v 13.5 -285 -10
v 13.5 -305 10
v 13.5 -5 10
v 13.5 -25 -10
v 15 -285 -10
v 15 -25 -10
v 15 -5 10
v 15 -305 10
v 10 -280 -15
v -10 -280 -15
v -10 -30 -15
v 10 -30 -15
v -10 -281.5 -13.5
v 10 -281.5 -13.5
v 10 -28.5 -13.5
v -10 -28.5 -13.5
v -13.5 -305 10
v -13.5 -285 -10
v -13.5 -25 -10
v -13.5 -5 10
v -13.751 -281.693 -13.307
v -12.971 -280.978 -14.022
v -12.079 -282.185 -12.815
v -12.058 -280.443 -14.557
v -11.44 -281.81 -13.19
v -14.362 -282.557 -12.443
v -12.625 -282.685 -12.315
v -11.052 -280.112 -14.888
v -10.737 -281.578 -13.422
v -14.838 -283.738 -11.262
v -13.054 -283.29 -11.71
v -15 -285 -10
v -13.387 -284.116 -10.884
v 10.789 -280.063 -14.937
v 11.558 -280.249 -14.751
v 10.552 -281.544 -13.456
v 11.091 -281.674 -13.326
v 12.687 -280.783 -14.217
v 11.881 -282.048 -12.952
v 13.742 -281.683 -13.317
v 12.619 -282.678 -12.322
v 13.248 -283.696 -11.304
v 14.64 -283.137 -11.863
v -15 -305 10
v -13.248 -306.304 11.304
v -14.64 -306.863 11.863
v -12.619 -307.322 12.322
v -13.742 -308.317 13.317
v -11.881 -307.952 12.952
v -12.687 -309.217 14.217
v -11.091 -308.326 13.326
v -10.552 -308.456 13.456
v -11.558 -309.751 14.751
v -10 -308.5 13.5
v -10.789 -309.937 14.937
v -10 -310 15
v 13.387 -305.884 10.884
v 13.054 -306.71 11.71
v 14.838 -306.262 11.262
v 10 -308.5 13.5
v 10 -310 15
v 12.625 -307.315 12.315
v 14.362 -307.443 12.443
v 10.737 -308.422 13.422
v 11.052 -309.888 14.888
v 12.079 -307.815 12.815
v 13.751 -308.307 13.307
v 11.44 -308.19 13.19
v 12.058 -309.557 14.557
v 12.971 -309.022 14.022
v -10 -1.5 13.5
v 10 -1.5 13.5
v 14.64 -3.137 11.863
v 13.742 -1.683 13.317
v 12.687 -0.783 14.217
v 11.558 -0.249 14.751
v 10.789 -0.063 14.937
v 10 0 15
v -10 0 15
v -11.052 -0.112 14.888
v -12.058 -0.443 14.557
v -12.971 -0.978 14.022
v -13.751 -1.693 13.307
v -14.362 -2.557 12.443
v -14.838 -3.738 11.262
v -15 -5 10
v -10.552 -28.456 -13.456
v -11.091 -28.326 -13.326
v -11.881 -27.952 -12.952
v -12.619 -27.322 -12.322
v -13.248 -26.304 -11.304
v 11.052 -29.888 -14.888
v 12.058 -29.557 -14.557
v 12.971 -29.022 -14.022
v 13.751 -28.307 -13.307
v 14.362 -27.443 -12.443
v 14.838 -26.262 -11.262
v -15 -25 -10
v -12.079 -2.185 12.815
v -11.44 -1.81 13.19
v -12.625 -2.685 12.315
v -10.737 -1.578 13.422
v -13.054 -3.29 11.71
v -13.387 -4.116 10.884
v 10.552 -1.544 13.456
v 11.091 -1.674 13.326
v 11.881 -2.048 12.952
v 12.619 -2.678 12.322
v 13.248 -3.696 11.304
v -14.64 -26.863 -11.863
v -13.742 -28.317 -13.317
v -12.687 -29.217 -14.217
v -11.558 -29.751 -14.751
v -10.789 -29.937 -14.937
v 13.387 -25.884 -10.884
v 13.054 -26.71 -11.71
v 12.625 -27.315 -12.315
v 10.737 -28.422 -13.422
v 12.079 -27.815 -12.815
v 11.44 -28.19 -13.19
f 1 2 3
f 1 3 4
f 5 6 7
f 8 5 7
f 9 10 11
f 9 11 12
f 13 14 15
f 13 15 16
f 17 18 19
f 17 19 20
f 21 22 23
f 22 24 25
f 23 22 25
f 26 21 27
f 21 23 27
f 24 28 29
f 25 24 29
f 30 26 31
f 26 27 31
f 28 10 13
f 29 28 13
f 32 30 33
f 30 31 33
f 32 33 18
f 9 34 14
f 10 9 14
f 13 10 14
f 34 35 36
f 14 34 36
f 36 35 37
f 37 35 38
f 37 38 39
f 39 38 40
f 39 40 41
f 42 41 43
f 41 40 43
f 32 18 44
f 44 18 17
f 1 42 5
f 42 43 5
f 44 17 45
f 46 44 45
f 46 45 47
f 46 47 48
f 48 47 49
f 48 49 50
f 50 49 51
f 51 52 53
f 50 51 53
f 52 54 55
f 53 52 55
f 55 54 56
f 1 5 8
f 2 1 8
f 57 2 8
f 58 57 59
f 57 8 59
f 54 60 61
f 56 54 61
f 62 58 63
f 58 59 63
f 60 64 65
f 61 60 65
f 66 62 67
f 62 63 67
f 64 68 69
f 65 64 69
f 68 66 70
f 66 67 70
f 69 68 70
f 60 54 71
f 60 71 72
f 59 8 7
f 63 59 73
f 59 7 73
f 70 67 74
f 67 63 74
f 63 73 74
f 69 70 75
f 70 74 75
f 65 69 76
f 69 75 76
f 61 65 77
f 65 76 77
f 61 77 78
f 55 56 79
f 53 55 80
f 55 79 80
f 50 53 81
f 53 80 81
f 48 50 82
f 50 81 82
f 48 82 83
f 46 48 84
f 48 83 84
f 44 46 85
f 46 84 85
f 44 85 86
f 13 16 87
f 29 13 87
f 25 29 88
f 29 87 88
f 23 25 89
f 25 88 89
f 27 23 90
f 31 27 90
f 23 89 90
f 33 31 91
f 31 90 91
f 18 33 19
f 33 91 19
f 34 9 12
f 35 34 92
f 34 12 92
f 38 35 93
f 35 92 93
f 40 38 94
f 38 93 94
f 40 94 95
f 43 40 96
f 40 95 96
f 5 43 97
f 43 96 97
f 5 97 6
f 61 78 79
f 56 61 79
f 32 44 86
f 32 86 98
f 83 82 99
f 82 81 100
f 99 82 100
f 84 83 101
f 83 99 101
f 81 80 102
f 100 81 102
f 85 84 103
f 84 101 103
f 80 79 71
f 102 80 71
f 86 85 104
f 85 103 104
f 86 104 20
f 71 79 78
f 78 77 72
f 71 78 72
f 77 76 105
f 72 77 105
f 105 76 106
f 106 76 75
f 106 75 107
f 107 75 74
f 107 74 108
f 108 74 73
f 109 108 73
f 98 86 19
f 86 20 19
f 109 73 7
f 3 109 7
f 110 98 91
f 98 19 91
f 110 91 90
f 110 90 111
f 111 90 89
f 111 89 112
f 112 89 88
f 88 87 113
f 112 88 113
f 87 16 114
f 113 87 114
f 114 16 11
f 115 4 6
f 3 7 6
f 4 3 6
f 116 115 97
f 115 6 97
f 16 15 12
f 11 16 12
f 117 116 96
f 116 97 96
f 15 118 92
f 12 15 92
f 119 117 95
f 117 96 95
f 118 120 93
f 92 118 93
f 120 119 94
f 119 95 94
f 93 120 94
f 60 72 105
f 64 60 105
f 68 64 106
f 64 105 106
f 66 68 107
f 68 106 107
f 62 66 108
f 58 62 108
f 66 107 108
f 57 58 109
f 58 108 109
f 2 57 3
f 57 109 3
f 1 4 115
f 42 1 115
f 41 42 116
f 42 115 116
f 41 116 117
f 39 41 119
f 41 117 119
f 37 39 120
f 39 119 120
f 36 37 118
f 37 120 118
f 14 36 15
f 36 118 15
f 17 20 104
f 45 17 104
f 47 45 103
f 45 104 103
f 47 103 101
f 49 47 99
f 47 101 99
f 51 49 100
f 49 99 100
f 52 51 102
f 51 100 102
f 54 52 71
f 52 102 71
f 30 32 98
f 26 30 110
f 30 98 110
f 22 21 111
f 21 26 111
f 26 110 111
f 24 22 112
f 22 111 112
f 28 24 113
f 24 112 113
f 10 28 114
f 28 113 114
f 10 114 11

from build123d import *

# Parameters (mm, degrees)
F1_DEPTH = 310
F3_DEPTH = 30.001


with BuildPart() as f1:
    # F0 (on Front) → F1 (new body)
    with BuildSketch(Plane.XZ):
        with BuildLine():
            Line((-10, -15), (10, -15))
            ThreePointArc((10, -15), (13.535534, -13.535534), (15, -10))
            Line((15, -10), (15, 10))
            ThreePointArc((15, 10), (13.535534, 13.535534), (10, 15))
            Line((10, 15), (-10, 15))
            ThreePointArc((-10, 15), (-13.535534, 13.535534), (-15, 10))
            Line((-15, 10), (-15, -10))
            ThreePointArc((-15, -10), (-13.535534, -13.535534), (-10, -15))
        make_face()
        with BuildLine():
            ThreePointArc((-10, -13.5), (-12.474874, -12.474874), (-13.5, -10))
            Line((-13.5, -10), (-13.5, 10))
            ThreePointArc((-13.5, 10), (-12.474874, 12.474874), (-10, 13.5))
            Line((-10, 13.5), (10, 13.5))
            ThreePointArc((10, 13.5), (12.474874, 12.474874), (13.5, 10))
            Line((13.5, 10), (13.5, -10))
            ThreePointArc((13.5, -10), (12.474874, -12.474874), (10, -13.5))
            Line((10, -13.5), (-10, -13.5))
        make_face(mode=Mode.SUBTRACT)
    extrude(amount=F1_DEPTH)

    # F2 (on face) → F3 (cut, through all)
    with BuildSketch(Plane.YZ.offset(15)):
        Polygon((0, -15), (0, 15), (-30, -15), align=None)
        Polygon((-310, 15), (-310, -15), (-280, -15), align=None)
    extrude(amount=-F3_DEPTH, mode=Mode.SUBTRACT)


solid = f1.part
